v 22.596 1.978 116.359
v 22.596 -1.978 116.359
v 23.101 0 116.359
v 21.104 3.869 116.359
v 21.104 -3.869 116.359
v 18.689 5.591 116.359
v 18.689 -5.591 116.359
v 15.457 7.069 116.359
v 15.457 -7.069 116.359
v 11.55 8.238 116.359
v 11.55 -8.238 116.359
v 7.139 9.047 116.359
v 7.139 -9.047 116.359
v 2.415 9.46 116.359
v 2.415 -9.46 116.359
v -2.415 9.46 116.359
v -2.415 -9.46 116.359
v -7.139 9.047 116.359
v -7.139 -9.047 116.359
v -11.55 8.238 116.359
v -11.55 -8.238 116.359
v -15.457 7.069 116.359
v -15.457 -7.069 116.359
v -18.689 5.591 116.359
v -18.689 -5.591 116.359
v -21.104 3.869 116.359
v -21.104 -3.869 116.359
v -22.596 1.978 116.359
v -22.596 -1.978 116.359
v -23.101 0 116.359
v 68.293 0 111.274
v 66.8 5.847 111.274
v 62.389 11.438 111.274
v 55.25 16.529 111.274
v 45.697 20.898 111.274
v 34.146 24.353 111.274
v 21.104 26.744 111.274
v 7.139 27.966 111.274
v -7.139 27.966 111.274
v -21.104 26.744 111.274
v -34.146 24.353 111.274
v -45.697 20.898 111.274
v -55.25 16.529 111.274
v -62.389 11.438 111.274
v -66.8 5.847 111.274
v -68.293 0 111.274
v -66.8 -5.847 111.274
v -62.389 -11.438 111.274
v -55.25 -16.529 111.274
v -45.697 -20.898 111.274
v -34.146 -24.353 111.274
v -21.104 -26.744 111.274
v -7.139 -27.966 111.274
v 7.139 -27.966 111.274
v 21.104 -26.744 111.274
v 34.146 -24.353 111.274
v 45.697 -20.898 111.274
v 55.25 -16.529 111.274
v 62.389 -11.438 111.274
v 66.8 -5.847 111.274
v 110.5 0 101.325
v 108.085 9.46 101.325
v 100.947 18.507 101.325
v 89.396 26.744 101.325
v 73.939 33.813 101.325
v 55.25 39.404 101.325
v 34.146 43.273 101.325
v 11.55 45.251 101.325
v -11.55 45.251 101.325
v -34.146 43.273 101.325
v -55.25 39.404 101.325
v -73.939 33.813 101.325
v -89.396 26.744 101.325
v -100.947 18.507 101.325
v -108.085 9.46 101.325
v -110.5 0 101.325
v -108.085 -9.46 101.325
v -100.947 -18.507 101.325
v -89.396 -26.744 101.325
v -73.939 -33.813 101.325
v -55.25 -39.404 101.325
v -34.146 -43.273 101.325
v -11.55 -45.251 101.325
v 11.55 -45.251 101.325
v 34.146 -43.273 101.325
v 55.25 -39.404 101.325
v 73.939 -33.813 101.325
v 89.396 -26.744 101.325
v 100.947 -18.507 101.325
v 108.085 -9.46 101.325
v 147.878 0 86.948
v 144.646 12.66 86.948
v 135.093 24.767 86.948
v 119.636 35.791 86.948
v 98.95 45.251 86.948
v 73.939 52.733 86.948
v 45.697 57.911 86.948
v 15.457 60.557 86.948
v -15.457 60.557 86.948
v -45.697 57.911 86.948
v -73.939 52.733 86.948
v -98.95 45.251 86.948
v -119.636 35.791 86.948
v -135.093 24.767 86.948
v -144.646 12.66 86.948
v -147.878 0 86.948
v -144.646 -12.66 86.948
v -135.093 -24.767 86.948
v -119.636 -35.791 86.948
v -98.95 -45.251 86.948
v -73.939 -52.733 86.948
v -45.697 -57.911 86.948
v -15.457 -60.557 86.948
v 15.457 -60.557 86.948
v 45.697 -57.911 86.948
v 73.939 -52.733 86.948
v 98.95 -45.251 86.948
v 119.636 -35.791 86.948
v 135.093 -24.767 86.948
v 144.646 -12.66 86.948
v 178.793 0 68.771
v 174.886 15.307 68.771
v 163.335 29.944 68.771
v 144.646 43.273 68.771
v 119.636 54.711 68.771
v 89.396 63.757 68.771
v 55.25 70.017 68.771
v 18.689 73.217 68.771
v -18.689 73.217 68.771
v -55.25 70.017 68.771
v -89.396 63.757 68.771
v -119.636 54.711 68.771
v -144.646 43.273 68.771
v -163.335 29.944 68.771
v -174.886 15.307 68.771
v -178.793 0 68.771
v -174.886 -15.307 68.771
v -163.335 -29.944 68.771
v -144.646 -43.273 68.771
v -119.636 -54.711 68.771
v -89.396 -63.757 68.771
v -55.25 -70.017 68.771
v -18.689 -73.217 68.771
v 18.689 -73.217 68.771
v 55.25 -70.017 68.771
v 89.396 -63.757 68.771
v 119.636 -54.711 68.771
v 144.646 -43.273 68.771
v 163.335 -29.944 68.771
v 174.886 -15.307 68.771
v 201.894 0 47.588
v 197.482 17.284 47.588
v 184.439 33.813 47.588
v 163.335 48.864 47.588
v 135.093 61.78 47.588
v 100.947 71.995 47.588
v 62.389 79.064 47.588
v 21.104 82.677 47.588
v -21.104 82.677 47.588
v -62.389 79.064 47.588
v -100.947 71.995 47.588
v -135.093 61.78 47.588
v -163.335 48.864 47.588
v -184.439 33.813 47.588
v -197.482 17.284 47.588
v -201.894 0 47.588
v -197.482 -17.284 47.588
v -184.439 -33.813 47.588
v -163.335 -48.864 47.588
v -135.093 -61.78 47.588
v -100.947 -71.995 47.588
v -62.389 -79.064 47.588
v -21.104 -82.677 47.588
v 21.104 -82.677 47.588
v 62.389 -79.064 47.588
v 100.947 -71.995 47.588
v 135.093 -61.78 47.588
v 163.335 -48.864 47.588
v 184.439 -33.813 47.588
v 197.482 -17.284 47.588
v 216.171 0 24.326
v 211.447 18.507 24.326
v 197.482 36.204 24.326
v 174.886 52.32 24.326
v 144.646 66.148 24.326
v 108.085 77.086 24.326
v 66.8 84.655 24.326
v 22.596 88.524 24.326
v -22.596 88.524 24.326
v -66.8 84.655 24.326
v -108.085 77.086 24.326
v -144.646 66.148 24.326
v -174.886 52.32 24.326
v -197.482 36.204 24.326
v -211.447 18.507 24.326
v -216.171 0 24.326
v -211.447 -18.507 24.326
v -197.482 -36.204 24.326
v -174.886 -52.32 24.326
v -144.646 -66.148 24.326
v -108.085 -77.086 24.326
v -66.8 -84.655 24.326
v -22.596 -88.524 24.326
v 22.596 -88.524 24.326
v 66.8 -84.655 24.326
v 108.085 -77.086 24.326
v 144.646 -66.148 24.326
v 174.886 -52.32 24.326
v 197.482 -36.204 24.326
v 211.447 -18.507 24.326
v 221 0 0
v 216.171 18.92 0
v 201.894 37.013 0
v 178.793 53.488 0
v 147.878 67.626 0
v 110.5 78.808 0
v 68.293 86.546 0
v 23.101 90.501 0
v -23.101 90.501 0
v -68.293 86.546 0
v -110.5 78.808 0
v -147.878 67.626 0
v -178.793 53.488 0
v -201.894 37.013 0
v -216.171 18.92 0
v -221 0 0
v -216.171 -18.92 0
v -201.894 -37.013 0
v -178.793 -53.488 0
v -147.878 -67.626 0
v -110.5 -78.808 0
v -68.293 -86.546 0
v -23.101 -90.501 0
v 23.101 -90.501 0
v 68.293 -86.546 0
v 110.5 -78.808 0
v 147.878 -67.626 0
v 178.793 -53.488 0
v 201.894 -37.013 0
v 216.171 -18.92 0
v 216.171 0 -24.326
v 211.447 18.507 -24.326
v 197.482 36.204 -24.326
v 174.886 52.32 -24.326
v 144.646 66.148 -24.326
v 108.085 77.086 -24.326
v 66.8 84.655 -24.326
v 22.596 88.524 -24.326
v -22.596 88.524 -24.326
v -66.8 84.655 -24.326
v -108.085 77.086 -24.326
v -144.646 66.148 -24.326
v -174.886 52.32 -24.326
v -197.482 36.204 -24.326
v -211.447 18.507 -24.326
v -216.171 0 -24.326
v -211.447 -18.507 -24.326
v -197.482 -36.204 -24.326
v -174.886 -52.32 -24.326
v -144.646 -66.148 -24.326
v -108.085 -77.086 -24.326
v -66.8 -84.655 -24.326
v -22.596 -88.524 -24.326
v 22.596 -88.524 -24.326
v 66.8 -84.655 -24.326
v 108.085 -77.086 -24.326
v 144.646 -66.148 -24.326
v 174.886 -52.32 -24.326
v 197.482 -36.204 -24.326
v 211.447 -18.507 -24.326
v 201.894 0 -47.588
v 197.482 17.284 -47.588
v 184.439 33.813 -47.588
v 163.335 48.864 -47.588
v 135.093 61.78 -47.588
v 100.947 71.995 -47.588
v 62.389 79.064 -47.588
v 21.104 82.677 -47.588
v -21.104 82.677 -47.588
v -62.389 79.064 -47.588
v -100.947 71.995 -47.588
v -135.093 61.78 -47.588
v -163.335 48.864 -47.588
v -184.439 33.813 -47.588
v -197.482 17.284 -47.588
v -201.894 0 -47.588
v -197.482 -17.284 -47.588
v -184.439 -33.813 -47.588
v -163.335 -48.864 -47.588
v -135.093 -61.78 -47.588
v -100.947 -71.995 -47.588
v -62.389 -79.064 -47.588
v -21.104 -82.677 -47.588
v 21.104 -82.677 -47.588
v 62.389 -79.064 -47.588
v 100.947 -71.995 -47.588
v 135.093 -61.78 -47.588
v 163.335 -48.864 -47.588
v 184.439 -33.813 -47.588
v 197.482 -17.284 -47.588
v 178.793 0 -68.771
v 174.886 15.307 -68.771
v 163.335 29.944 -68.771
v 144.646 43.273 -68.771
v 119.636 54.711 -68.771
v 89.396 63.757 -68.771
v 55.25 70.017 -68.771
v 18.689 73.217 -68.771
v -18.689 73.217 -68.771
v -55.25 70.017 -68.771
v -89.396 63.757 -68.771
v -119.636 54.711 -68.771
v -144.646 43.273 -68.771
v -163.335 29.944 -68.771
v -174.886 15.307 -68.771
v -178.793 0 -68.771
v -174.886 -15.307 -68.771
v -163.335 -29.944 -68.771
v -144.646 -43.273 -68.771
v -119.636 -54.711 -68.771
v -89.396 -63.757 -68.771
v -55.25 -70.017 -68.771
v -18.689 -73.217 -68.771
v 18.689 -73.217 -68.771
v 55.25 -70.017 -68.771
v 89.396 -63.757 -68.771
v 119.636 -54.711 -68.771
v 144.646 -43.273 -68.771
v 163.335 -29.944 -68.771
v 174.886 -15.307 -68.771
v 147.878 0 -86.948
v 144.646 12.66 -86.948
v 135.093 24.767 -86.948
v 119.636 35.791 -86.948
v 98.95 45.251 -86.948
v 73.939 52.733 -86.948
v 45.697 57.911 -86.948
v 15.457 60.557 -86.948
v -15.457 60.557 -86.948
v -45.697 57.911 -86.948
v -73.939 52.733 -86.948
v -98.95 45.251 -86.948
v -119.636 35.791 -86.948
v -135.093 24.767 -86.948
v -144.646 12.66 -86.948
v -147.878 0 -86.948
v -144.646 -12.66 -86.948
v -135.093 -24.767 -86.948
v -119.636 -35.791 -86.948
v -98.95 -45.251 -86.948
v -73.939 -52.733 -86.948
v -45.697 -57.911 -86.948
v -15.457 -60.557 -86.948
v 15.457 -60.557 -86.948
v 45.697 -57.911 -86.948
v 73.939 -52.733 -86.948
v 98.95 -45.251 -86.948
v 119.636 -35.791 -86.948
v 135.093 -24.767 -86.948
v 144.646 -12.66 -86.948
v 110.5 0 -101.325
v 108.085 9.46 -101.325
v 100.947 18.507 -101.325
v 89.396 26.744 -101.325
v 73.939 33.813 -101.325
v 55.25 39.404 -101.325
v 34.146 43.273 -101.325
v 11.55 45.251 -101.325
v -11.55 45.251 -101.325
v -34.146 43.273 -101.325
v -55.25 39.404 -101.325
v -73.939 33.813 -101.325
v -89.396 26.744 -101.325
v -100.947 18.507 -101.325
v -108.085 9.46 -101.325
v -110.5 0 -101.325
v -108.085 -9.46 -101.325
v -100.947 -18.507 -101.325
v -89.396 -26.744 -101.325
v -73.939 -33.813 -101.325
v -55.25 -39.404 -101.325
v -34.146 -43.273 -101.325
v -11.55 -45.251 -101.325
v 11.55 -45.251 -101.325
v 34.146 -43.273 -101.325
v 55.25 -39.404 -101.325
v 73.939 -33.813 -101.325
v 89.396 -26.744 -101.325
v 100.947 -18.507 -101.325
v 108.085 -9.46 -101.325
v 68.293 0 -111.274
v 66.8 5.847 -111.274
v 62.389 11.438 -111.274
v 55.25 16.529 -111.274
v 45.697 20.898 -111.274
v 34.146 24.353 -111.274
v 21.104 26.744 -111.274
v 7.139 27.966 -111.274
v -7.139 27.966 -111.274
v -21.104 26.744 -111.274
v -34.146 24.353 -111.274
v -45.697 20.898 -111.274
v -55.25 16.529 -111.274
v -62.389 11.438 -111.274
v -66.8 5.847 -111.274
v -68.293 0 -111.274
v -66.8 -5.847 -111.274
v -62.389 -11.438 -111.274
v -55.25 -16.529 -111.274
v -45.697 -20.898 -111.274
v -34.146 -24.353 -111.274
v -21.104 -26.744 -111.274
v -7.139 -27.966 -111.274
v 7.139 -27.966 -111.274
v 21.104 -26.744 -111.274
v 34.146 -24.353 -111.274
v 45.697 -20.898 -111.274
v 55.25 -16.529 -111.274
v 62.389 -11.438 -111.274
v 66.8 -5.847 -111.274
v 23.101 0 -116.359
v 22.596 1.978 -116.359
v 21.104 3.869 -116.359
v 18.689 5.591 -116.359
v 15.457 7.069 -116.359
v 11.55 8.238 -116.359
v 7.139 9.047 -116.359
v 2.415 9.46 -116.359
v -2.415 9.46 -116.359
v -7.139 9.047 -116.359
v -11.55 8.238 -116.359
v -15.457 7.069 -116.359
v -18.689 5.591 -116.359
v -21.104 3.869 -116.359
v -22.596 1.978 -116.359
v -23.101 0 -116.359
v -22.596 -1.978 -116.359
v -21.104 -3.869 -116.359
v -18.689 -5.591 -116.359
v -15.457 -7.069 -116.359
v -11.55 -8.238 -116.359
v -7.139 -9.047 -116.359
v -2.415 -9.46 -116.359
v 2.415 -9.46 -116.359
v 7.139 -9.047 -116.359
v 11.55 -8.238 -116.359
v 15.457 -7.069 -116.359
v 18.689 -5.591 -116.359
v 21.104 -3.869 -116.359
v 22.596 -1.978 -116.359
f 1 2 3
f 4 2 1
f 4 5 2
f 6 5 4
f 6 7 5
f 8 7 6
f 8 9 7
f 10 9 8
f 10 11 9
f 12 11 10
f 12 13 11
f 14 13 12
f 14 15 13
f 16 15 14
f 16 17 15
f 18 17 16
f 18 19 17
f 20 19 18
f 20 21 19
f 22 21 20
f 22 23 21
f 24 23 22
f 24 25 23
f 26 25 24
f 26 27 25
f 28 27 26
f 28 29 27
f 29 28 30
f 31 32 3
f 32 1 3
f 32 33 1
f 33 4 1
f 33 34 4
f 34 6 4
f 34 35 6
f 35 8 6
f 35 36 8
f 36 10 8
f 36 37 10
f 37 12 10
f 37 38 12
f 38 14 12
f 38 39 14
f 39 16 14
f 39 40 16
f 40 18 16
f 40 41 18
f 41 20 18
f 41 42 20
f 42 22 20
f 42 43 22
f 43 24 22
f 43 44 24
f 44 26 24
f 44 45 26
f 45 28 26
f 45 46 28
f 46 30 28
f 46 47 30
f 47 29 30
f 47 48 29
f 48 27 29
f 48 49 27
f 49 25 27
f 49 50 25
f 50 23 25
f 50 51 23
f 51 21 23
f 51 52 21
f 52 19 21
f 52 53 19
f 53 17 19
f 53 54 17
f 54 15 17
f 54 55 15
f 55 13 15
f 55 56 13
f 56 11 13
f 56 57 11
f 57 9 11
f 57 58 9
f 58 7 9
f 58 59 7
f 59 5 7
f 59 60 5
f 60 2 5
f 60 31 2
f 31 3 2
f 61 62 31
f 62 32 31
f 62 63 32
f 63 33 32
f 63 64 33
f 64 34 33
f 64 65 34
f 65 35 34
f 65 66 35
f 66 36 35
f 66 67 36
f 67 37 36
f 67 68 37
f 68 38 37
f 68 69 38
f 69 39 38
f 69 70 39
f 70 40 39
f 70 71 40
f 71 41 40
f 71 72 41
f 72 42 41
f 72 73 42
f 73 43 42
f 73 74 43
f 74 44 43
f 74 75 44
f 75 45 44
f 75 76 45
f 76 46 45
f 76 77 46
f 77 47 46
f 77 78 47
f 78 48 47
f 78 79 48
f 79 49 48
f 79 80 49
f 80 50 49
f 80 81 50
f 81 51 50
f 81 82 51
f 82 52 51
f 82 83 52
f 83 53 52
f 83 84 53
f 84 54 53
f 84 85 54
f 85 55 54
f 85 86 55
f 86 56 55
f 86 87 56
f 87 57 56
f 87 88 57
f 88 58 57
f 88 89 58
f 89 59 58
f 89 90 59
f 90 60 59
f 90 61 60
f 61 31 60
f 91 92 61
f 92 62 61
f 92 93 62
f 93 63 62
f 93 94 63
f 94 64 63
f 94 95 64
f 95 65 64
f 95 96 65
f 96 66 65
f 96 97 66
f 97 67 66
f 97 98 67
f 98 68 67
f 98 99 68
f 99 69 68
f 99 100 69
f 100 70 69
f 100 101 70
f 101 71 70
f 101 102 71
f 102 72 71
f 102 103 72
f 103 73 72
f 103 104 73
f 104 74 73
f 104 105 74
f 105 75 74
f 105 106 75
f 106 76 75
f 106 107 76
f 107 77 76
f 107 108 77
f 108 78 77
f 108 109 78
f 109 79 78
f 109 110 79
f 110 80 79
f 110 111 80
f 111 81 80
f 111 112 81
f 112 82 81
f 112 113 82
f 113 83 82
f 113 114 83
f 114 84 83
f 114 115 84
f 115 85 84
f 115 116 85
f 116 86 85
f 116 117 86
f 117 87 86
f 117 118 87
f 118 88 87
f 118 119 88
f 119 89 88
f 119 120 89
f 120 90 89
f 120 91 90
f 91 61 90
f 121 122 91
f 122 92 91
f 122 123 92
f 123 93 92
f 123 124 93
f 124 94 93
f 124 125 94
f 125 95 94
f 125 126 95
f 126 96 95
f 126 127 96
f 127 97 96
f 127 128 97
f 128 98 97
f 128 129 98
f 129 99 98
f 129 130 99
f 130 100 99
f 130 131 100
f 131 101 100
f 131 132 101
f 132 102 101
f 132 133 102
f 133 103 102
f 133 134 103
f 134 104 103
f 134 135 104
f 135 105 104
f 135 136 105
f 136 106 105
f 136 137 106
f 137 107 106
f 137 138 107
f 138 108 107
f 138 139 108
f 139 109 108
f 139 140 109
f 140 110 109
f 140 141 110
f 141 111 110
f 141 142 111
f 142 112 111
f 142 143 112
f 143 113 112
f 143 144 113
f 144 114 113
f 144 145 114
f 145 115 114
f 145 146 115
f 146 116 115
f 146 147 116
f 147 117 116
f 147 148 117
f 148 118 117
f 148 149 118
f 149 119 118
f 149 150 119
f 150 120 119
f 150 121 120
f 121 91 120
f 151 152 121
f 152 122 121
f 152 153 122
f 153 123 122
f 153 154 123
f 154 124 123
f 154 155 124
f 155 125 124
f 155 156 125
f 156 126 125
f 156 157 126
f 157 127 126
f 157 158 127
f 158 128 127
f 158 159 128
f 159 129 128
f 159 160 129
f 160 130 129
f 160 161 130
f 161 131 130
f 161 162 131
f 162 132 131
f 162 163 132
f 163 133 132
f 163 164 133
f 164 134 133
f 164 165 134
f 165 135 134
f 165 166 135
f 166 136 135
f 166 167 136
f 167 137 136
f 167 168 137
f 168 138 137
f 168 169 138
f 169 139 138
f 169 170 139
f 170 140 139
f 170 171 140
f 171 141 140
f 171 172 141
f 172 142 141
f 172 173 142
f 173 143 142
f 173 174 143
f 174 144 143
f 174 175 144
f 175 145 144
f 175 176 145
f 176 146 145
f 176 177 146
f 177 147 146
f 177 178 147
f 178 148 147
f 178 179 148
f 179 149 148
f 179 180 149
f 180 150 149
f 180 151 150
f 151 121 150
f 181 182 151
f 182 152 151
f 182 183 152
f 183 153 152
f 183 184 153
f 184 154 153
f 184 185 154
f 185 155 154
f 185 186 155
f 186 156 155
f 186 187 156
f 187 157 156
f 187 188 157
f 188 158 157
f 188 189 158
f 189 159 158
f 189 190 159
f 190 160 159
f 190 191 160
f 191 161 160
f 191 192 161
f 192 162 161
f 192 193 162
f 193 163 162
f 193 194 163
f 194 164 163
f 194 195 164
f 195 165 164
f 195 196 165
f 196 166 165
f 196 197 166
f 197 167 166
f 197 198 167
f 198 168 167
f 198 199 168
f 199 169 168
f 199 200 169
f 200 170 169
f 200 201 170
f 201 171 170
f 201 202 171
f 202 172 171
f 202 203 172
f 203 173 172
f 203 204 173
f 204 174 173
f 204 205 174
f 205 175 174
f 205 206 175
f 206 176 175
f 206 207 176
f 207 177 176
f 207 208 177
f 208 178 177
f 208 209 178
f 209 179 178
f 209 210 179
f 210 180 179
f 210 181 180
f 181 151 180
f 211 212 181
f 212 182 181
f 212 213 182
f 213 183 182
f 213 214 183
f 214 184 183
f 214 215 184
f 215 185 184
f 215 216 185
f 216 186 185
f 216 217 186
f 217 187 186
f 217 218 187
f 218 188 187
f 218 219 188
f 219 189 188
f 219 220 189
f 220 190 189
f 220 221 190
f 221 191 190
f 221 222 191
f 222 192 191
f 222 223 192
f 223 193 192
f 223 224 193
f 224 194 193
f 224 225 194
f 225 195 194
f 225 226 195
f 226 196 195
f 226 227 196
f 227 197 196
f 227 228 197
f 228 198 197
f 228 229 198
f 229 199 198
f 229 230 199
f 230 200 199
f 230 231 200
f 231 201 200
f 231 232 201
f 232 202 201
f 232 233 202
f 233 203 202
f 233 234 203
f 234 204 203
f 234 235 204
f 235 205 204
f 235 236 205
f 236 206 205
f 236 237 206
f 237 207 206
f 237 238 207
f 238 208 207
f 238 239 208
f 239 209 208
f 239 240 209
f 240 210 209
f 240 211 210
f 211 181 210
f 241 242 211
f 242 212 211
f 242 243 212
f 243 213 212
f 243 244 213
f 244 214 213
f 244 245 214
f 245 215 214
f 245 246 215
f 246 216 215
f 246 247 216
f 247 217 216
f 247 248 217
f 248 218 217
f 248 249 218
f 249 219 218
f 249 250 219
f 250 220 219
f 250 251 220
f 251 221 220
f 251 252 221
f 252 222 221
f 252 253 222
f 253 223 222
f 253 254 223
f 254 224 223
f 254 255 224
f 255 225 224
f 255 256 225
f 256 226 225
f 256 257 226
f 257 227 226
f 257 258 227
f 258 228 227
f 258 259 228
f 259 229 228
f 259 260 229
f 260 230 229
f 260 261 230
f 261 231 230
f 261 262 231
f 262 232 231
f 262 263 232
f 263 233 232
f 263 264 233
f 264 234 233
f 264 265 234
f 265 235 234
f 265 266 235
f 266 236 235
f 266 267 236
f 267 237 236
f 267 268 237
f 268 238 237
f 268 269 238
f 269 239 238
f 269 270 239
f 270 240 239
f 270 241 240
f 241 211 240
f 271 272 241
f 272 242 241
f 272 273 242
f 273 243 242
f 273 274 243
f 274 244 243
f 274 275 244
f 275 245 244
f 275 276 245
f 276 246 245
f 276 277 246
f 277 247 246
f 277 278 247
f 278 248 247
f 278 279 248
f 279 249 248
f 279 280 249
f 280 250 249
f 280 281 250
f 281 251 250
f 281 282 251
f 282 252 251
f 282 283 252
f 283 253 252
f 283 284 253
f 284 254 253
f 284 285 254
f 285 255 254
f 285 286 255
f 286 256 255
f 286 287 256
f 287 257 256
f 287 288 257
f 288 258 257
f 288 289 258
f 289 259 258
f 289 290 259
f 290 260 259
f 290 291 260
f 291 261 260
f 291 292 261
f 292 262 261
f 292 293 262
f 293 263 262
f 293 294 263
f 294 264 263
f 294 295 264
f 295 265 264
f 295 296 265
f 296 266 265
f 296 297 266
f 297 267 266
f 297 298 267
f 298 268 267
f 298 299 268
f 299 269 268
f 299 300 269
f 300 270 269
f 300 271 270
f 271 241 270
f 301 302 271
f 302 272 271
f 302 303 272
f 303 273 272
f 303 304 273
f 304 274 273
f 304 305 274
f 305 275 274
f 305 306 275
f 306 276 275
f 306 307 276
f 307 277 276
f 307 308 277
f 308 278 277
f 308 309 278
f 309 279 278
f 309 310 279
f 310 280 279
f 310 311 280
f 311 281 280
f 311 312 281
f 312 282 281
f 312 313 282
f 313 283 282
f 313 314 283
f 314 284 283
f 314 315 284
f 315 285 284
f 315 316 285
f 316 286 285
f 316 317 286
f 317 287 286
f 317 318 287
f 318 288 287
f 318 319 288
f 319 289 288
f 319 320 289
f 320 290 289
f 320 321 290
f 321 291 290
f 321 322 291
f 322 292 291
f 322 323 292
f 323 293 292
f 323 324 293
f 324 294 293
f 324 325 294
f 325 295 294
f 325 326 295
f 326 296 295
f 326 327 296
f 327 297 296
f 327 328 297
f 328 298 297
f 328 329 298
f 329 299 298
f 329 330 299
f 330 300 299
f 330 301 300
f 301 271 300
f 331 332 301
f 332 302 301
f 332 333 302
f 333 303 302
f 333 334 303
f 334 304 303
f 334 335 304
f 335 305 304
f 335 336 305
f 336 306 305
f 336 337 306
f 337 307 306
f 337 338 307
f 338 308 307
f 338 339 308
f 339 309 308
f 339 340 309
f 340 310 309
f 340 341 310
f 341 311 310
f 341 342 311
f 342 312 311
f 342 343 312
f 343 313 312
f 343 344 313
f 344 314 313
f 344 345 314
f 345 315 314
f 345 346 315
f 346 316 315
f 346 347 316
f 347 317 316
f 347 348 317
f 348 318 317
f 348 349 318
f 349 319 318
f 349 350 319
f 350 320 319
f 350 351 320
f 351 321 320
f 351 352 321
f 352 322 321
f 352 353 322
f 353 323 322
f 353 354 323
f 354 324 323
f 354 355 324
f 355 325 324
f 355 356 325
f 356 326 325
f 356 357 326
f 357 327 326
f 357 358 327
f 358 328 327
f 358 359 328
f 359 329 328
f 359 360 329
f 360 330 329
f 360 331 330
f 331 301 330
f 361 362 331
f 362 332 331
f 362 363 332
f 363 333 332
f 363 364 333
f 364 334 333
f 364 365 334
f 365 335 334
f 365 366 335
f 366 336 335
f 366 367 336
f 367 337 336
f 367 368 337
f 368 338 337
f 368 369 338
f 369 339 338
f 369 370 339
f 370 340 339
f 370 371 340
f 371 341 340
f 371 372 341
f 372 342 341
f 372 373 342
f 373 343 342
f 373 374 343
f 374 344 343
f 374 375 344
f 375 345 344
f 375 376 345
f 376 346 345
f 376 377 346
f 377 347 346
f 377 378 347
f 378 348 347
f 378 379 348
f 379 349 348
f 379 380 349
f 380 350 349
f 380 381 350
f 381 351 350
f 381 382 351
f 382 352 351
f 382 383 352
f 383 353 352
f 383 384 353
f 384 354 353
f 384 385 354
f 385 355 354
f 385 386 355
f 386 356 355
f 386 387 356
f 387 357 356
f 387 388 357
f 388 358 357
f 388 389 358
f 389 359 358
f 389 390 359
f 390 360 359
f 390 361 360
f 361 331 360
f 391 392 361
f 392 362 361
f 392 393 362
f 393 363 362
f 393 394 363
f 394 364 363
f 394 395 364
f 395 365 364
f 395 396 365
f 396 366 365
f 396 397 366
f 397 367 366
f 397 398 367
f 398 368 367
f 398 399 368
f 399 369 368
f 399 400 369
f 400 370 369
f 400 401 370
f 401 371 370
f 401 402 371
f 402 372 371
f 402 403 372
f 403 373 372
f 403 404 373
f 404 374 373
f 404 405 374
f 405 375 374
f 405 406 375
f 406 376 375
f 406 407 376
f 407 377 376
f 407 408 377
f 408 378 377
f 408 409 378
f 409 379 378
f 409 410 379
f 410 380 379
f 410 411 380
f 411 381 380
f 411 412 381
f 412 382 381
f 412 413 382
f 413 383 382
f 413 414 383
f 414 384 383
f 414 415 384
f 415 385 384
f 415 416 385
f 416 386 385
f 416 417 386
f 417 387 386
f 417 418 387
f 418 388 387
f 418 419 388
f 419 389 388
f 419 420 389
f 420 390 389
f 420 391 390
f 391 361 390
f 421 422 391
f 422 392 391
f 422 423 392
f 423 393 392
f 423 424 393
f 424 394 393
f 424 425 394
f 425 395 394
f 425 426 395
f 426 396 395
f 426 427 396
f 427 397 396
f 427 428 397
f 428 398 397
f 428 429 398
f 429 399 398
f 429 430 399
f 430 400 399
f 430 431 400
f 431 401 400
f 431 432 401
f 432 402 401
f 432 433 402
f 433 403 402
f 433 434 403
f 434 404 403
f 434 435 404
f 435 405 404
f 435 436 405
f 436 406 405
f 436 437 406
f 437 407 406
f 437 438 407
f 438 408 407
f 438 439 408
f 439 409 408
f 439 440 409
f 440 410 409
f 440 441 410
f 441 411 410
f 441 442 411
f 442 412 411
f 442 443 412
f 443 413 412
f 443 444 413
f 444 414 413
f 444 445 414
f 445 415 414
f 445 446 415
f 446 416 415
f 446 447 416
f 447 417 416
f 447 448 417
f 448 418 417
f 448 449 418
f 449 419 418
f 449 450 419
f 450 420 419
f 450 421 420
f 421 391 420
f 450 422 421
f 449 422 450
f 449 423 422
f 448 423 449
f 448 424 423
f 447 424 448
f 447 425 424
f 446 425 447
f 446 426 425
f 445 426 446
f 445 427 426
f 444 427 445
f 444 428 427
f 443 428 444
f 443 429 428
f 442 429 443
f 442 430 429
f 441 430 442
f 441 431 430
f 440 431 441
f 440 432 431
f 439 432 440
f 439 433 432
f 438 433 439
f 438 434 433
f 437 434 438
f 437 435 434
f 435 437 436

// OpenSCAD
// Generated by SolidPython 1.0.1 on 2020-07-29 00:46:52


scale(v = [17, 7, 9]) {
	sphere(r = 13);
}
/***********************************************
*********      SolidPython code:      **********
************************************************
 
# import packages: SolidPython
from solid import *
from solid.utils import *
from itertools import chain, combinations, permutations


class Resize:

    def __init__(self, scad_file):
        self.scad_file = scad_file
        #self.scad_file = import_scad(scad_file)
        # cone/cylinder param:
        self.r1 = 0
        self.r2 = 0
        self.h = 0
        # rectangular prism param:
        self.w = 0
        self.l = 0
        # ellipse param:
        self.r = 0

    # import OpenScad code (file name corresponds to shape)


    # classify shape + parameters
    def assign(self, param1, param2, param3):
        if self.scad_file == 'cone.scad':
            self.r1 = param1
            self.r2 = param2
            self.h = param3
        elif self.scad_file == 'cylinder.scad':
            self.r1 = param1
            self.r2 = param2
            self.h = param3
        elif self.scad_file == 'rectangularPrism.scad':
            self.h = param1
            self.l = param2
            self.w = param3
        else:
            self.r = param1
            self.h = param2

    # resize parameters
    def iterate(self):
        x = range(3, 20, 2)
        i = 1
        if self.scad_file == 'cone.scad':
            tempList = list(permutations(x, 2))
            for temp in tempList:
                param1 = temp[0]
                param2 = temp[1]
                filepath = 'produced_scad_files/' + 'cone' + str(param1) + '_' + str(param2) + '_' + '.scad'
                scad_render_to_file(cylinder(h=param1, r1=param2, r2=0), filepath)

        elif self.scad_file == 'cylinder.scad':
            tempList = list(permutations(x, 3))
            for temp in tempList:
                param1 = temp[0]
                param2 = temp[1]
                filepath = 'produced_scad_files/' + 'cylinder' + str(param1) + '_' + str(param2) + '_' + '.scad'
                scad_render_to_file(cylinder(h=param1, r1=param2, r2=param2), filepath)

        elif self.scad_file == 'rectangularPrism.scad':
            tempList = list(permutations(x, 3))
            for temp in tempList:
                param1 = temp[0]
                param2 = temp[1]
                param3 = temp[2]
                filepath = 'produced_scad_files/' + 'rectangularPrism' + str(param1) + '_' + str(param2) + '_' + str(
                    param3) + '.scad'
                scad_render_to_file(cube(size=(param1, param2, param3)), filepath)

        elif self.scad_file == 'ellipse.scad':
            tempList = list(permutations(x, 4))
            for temp in tempList:
                param1 = temp[0]
                param2 = temp[1]
                param3 = temp[2]
                param4 = temp[3]
                filepath = 'produced_scad_files/' + 'ellipse' + str(param1) + '_' + str(param2) + '_' + str(param3) + '_' + str(param4) + '.scad'
                scad_render_to_file(scale([param1, param2, param3])(sphere(r=param4)), filepath)

    def render_to_scadfile(self):
        scad_render_to_file(scad, 'example.scad') 
 
************************************************/
